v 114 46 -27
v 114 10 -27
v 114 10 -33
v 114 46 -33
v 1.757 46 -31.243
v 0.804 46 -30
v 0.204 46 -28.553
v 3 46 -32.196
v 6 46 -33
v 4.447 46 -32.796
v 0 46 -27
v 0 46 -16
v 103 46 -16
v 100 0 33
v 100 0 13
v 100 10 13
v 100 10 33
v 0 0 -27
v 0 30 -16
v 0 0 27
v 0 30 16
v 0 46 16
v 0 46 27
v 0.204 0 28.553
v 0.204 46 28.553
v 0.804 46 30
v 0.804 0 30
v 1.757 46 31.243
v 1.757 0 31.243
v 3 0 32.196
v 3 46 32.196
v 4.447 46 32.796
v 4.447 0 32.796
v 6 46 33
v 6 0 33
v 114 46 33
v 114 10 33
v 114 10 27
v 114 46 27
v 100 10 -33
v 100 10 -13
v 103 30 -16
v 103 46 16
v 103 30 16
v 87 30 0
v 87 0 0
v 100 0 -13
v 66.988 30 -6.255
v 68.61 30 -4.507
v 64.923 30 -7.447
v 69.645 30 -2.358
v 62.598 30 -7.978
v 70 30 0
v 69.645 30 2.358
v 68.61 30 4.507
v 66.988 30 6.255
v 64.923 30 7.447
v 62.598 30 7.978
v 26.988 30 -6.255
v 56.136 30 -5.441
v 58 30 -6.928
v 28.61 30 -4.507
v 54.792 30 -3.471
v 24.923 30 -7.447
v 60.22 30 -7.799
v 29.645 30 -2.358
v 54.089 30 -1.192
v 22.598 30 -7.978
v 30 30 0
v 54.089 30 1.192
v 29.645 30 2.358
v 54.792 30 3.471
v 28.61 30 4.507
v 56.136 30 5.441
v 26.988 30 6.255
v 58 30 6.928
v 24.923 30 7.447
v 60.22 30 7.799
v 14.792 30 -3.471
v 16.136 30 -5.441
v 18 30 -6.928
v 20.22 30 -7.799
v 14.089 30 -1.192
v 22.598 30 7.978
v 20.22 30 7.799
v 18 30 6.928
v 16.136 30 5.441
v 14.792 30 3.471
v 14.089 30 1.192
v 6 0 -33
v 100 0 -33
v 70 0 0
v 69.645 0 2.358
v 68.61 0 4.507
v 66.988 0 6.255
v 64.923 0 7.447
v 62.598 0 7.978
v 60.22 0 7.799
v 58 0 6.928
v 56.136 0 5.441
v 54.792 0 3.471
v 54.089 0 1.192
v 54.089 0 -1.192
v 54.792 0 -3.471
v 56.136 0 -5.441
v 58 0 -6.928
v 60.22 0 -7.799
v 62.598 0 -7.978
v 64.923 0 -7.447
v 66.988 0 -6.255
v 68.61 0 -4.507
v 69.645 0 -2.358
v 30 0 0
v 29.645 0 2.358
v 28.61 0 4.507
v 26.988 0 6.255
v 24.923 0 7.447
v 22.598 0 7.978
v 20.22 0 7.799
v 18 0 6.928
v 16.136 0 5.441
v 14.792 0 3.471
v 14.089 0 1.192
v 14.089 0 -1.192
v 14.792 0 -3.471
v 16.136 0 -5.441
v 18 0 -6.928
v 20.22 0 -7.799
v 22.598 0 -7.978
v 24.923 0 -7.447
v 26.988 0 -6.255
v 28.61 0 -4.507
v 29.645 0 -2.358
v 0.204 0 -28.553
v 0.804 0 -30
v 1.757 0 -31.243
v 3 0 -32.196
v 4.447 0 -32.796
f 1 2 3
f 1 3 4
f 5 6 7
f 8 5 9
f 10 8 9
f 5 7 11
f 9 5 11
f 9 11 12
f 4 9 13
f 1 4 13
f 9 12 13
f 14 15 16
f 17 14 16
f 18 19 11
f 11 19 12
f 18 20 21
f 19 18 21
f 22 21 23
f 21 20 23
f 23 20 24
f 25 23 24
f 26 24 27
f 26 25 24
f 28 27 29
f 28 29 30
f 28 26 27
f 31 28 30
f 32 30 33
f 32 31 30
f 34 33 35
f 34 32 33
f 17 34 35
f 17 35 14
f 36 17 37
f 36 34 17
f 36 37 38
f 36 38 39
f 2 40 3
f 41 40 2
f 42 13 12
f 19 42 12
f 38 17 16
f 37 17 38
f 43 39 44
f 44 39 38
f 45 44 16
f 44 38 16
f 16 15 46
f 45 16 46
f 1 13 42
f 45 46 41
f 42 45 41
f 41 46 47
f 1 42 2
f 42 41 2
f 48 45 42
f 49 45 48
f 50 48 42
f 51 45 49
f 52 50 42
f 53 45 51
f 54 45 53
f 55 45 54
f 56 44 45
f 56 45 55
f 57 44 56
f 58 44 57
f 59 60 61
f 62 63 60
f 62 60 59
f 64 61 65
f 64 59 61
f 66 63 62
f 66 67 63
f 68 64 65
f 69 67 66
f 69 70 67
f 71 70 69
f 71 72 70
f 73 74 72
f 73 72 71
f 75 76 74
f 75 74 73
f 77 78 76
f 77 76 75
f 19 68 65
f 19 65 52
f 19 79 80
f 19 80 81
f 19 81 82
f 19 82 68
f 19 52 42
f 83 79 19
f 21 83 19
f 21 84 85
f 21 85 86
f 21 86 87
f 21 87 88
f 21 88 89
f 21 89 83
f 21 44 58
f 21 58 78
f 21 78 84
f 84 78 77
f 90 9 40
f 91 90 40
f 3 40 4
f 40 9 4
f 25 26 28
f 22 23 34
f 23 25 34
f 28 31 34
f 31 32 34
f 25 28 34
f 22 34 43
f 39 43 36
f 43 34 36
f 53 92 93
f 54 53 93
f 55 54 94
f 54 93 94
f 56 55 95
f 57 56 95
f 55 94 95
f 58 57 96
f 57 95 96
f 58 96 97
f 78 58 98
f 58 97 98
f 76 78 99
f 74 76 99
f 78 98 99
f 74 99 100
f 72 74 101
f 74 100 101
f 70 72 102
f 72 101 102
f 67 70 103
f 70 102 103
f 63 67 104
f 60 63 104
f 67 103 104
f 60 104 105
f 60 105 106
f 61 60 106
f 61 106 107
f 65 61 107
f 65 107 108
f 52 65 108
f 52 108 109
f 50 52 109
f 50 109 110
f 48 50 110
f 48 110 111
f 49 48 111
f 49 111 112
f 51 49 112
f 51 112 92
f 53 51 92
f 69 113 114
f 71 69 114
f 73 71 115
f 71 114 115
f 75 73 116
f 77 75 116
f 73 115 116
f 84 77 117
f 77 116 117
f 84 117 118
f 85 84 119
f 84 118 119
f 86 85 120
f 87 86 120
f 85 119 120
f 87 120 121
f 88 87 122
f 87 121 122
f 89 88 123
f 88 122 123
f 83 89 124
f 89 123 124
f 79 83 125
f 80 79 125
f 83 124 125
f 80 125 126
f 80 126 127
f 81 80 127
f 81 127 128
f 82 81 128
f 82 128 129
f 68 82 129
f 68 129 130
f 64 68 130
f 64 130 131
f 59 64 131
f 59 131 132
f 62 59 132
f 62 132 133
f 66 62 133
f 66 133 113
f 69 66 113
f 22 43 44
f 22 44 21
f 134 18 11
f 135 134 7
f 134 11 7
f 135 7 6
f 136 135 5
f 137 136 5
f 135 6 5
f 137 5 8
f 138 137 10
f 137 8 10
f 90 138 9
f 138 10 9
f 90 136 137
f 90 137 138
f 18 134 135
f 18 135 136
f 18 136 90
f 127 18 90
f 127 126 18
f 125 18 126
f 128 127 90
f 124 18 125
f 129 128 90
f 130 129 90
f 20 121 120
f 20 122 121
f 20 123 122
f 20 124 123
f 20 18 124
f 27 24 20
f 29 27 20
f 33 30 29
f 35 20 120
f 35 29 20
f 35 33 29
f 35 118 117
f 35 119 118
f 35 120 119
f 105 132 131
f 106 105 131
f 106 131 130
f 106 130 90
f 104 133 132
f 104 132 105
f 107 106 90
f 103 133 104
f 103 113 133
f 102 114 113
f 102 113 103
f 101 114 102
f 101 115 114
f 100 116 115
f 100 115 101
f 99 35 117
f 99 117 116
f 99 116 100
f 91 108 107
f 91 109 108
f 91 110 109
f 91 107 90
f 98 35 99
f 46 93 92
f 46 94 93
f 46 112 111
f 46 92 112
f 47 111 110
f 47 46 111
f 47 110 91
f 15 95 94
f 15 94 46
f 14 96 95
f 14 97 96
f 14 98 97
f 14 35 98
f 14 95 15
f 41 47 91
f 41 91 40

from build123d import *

# Parameters (mm, degrees)
F0_W     = 114
F0_H     = 46
F1_DEPTH = 33
F3_R     = 6
F2_R     = 8
F4_DEPTH = 46.001
F5_W     = 14
F5_H     = 10
F6_DEPTH = 66.001
F7_W     = 114
F7_H     = 32
F8_DEPTH = 16


with BuildPart() as f1:
    # F0 (on Top) → F1 (new body, symmetric)
    with BuildSketch(Plane.XY):
        with Locations((57, 23)):
            Rectangle(F0_W, F0_H)
    extrude(amount=F1_DEPTH, both=True)

    # F3
    f3_edges = [f1.edges().sort_by_distance(p)[0] for p in [
        (0, 23, 33),
        (0, 23, -33),
    ]]
    fillet(f3_edges, radius=F3_R)

    # F2 (on face) → F4 (cut, through all)
    with BuildSketch(Plane.XZ):
        Polygon((114, -27), (114, 27), (87, 0), align=None)
        with Locations((22, 0)):
            Circle(F2_R)
        with Locations((62, 0)):
            Circle(F2_R)
    extrude(amount=-F4_DEPTH, mode=Mode.SUBTRACT)

    # F5 (on face) → F6 (cut, through all)
    with BuildSketch(Plane.XY.offset(33)):
        with Locations((107, 5)):
            Rectangle(F5_W, F5_H)
    extrude(amount=-F6_DEPTH, mode=Mode.SUBTRACT)

    # F7 (on face) → F8 (cut)
    with BuildSketch(Plane(origin=(0, 46, 0), x_dir=(-1, 0, 0), z_dir=(0, 1, 0))):
        with Locations((-57, 0)):
            Rectangle(F7_W, F7_H)
    extrude(amount=-F8_DEPTH, mode=Mode.SUBTRACT)


solid = f1.part
